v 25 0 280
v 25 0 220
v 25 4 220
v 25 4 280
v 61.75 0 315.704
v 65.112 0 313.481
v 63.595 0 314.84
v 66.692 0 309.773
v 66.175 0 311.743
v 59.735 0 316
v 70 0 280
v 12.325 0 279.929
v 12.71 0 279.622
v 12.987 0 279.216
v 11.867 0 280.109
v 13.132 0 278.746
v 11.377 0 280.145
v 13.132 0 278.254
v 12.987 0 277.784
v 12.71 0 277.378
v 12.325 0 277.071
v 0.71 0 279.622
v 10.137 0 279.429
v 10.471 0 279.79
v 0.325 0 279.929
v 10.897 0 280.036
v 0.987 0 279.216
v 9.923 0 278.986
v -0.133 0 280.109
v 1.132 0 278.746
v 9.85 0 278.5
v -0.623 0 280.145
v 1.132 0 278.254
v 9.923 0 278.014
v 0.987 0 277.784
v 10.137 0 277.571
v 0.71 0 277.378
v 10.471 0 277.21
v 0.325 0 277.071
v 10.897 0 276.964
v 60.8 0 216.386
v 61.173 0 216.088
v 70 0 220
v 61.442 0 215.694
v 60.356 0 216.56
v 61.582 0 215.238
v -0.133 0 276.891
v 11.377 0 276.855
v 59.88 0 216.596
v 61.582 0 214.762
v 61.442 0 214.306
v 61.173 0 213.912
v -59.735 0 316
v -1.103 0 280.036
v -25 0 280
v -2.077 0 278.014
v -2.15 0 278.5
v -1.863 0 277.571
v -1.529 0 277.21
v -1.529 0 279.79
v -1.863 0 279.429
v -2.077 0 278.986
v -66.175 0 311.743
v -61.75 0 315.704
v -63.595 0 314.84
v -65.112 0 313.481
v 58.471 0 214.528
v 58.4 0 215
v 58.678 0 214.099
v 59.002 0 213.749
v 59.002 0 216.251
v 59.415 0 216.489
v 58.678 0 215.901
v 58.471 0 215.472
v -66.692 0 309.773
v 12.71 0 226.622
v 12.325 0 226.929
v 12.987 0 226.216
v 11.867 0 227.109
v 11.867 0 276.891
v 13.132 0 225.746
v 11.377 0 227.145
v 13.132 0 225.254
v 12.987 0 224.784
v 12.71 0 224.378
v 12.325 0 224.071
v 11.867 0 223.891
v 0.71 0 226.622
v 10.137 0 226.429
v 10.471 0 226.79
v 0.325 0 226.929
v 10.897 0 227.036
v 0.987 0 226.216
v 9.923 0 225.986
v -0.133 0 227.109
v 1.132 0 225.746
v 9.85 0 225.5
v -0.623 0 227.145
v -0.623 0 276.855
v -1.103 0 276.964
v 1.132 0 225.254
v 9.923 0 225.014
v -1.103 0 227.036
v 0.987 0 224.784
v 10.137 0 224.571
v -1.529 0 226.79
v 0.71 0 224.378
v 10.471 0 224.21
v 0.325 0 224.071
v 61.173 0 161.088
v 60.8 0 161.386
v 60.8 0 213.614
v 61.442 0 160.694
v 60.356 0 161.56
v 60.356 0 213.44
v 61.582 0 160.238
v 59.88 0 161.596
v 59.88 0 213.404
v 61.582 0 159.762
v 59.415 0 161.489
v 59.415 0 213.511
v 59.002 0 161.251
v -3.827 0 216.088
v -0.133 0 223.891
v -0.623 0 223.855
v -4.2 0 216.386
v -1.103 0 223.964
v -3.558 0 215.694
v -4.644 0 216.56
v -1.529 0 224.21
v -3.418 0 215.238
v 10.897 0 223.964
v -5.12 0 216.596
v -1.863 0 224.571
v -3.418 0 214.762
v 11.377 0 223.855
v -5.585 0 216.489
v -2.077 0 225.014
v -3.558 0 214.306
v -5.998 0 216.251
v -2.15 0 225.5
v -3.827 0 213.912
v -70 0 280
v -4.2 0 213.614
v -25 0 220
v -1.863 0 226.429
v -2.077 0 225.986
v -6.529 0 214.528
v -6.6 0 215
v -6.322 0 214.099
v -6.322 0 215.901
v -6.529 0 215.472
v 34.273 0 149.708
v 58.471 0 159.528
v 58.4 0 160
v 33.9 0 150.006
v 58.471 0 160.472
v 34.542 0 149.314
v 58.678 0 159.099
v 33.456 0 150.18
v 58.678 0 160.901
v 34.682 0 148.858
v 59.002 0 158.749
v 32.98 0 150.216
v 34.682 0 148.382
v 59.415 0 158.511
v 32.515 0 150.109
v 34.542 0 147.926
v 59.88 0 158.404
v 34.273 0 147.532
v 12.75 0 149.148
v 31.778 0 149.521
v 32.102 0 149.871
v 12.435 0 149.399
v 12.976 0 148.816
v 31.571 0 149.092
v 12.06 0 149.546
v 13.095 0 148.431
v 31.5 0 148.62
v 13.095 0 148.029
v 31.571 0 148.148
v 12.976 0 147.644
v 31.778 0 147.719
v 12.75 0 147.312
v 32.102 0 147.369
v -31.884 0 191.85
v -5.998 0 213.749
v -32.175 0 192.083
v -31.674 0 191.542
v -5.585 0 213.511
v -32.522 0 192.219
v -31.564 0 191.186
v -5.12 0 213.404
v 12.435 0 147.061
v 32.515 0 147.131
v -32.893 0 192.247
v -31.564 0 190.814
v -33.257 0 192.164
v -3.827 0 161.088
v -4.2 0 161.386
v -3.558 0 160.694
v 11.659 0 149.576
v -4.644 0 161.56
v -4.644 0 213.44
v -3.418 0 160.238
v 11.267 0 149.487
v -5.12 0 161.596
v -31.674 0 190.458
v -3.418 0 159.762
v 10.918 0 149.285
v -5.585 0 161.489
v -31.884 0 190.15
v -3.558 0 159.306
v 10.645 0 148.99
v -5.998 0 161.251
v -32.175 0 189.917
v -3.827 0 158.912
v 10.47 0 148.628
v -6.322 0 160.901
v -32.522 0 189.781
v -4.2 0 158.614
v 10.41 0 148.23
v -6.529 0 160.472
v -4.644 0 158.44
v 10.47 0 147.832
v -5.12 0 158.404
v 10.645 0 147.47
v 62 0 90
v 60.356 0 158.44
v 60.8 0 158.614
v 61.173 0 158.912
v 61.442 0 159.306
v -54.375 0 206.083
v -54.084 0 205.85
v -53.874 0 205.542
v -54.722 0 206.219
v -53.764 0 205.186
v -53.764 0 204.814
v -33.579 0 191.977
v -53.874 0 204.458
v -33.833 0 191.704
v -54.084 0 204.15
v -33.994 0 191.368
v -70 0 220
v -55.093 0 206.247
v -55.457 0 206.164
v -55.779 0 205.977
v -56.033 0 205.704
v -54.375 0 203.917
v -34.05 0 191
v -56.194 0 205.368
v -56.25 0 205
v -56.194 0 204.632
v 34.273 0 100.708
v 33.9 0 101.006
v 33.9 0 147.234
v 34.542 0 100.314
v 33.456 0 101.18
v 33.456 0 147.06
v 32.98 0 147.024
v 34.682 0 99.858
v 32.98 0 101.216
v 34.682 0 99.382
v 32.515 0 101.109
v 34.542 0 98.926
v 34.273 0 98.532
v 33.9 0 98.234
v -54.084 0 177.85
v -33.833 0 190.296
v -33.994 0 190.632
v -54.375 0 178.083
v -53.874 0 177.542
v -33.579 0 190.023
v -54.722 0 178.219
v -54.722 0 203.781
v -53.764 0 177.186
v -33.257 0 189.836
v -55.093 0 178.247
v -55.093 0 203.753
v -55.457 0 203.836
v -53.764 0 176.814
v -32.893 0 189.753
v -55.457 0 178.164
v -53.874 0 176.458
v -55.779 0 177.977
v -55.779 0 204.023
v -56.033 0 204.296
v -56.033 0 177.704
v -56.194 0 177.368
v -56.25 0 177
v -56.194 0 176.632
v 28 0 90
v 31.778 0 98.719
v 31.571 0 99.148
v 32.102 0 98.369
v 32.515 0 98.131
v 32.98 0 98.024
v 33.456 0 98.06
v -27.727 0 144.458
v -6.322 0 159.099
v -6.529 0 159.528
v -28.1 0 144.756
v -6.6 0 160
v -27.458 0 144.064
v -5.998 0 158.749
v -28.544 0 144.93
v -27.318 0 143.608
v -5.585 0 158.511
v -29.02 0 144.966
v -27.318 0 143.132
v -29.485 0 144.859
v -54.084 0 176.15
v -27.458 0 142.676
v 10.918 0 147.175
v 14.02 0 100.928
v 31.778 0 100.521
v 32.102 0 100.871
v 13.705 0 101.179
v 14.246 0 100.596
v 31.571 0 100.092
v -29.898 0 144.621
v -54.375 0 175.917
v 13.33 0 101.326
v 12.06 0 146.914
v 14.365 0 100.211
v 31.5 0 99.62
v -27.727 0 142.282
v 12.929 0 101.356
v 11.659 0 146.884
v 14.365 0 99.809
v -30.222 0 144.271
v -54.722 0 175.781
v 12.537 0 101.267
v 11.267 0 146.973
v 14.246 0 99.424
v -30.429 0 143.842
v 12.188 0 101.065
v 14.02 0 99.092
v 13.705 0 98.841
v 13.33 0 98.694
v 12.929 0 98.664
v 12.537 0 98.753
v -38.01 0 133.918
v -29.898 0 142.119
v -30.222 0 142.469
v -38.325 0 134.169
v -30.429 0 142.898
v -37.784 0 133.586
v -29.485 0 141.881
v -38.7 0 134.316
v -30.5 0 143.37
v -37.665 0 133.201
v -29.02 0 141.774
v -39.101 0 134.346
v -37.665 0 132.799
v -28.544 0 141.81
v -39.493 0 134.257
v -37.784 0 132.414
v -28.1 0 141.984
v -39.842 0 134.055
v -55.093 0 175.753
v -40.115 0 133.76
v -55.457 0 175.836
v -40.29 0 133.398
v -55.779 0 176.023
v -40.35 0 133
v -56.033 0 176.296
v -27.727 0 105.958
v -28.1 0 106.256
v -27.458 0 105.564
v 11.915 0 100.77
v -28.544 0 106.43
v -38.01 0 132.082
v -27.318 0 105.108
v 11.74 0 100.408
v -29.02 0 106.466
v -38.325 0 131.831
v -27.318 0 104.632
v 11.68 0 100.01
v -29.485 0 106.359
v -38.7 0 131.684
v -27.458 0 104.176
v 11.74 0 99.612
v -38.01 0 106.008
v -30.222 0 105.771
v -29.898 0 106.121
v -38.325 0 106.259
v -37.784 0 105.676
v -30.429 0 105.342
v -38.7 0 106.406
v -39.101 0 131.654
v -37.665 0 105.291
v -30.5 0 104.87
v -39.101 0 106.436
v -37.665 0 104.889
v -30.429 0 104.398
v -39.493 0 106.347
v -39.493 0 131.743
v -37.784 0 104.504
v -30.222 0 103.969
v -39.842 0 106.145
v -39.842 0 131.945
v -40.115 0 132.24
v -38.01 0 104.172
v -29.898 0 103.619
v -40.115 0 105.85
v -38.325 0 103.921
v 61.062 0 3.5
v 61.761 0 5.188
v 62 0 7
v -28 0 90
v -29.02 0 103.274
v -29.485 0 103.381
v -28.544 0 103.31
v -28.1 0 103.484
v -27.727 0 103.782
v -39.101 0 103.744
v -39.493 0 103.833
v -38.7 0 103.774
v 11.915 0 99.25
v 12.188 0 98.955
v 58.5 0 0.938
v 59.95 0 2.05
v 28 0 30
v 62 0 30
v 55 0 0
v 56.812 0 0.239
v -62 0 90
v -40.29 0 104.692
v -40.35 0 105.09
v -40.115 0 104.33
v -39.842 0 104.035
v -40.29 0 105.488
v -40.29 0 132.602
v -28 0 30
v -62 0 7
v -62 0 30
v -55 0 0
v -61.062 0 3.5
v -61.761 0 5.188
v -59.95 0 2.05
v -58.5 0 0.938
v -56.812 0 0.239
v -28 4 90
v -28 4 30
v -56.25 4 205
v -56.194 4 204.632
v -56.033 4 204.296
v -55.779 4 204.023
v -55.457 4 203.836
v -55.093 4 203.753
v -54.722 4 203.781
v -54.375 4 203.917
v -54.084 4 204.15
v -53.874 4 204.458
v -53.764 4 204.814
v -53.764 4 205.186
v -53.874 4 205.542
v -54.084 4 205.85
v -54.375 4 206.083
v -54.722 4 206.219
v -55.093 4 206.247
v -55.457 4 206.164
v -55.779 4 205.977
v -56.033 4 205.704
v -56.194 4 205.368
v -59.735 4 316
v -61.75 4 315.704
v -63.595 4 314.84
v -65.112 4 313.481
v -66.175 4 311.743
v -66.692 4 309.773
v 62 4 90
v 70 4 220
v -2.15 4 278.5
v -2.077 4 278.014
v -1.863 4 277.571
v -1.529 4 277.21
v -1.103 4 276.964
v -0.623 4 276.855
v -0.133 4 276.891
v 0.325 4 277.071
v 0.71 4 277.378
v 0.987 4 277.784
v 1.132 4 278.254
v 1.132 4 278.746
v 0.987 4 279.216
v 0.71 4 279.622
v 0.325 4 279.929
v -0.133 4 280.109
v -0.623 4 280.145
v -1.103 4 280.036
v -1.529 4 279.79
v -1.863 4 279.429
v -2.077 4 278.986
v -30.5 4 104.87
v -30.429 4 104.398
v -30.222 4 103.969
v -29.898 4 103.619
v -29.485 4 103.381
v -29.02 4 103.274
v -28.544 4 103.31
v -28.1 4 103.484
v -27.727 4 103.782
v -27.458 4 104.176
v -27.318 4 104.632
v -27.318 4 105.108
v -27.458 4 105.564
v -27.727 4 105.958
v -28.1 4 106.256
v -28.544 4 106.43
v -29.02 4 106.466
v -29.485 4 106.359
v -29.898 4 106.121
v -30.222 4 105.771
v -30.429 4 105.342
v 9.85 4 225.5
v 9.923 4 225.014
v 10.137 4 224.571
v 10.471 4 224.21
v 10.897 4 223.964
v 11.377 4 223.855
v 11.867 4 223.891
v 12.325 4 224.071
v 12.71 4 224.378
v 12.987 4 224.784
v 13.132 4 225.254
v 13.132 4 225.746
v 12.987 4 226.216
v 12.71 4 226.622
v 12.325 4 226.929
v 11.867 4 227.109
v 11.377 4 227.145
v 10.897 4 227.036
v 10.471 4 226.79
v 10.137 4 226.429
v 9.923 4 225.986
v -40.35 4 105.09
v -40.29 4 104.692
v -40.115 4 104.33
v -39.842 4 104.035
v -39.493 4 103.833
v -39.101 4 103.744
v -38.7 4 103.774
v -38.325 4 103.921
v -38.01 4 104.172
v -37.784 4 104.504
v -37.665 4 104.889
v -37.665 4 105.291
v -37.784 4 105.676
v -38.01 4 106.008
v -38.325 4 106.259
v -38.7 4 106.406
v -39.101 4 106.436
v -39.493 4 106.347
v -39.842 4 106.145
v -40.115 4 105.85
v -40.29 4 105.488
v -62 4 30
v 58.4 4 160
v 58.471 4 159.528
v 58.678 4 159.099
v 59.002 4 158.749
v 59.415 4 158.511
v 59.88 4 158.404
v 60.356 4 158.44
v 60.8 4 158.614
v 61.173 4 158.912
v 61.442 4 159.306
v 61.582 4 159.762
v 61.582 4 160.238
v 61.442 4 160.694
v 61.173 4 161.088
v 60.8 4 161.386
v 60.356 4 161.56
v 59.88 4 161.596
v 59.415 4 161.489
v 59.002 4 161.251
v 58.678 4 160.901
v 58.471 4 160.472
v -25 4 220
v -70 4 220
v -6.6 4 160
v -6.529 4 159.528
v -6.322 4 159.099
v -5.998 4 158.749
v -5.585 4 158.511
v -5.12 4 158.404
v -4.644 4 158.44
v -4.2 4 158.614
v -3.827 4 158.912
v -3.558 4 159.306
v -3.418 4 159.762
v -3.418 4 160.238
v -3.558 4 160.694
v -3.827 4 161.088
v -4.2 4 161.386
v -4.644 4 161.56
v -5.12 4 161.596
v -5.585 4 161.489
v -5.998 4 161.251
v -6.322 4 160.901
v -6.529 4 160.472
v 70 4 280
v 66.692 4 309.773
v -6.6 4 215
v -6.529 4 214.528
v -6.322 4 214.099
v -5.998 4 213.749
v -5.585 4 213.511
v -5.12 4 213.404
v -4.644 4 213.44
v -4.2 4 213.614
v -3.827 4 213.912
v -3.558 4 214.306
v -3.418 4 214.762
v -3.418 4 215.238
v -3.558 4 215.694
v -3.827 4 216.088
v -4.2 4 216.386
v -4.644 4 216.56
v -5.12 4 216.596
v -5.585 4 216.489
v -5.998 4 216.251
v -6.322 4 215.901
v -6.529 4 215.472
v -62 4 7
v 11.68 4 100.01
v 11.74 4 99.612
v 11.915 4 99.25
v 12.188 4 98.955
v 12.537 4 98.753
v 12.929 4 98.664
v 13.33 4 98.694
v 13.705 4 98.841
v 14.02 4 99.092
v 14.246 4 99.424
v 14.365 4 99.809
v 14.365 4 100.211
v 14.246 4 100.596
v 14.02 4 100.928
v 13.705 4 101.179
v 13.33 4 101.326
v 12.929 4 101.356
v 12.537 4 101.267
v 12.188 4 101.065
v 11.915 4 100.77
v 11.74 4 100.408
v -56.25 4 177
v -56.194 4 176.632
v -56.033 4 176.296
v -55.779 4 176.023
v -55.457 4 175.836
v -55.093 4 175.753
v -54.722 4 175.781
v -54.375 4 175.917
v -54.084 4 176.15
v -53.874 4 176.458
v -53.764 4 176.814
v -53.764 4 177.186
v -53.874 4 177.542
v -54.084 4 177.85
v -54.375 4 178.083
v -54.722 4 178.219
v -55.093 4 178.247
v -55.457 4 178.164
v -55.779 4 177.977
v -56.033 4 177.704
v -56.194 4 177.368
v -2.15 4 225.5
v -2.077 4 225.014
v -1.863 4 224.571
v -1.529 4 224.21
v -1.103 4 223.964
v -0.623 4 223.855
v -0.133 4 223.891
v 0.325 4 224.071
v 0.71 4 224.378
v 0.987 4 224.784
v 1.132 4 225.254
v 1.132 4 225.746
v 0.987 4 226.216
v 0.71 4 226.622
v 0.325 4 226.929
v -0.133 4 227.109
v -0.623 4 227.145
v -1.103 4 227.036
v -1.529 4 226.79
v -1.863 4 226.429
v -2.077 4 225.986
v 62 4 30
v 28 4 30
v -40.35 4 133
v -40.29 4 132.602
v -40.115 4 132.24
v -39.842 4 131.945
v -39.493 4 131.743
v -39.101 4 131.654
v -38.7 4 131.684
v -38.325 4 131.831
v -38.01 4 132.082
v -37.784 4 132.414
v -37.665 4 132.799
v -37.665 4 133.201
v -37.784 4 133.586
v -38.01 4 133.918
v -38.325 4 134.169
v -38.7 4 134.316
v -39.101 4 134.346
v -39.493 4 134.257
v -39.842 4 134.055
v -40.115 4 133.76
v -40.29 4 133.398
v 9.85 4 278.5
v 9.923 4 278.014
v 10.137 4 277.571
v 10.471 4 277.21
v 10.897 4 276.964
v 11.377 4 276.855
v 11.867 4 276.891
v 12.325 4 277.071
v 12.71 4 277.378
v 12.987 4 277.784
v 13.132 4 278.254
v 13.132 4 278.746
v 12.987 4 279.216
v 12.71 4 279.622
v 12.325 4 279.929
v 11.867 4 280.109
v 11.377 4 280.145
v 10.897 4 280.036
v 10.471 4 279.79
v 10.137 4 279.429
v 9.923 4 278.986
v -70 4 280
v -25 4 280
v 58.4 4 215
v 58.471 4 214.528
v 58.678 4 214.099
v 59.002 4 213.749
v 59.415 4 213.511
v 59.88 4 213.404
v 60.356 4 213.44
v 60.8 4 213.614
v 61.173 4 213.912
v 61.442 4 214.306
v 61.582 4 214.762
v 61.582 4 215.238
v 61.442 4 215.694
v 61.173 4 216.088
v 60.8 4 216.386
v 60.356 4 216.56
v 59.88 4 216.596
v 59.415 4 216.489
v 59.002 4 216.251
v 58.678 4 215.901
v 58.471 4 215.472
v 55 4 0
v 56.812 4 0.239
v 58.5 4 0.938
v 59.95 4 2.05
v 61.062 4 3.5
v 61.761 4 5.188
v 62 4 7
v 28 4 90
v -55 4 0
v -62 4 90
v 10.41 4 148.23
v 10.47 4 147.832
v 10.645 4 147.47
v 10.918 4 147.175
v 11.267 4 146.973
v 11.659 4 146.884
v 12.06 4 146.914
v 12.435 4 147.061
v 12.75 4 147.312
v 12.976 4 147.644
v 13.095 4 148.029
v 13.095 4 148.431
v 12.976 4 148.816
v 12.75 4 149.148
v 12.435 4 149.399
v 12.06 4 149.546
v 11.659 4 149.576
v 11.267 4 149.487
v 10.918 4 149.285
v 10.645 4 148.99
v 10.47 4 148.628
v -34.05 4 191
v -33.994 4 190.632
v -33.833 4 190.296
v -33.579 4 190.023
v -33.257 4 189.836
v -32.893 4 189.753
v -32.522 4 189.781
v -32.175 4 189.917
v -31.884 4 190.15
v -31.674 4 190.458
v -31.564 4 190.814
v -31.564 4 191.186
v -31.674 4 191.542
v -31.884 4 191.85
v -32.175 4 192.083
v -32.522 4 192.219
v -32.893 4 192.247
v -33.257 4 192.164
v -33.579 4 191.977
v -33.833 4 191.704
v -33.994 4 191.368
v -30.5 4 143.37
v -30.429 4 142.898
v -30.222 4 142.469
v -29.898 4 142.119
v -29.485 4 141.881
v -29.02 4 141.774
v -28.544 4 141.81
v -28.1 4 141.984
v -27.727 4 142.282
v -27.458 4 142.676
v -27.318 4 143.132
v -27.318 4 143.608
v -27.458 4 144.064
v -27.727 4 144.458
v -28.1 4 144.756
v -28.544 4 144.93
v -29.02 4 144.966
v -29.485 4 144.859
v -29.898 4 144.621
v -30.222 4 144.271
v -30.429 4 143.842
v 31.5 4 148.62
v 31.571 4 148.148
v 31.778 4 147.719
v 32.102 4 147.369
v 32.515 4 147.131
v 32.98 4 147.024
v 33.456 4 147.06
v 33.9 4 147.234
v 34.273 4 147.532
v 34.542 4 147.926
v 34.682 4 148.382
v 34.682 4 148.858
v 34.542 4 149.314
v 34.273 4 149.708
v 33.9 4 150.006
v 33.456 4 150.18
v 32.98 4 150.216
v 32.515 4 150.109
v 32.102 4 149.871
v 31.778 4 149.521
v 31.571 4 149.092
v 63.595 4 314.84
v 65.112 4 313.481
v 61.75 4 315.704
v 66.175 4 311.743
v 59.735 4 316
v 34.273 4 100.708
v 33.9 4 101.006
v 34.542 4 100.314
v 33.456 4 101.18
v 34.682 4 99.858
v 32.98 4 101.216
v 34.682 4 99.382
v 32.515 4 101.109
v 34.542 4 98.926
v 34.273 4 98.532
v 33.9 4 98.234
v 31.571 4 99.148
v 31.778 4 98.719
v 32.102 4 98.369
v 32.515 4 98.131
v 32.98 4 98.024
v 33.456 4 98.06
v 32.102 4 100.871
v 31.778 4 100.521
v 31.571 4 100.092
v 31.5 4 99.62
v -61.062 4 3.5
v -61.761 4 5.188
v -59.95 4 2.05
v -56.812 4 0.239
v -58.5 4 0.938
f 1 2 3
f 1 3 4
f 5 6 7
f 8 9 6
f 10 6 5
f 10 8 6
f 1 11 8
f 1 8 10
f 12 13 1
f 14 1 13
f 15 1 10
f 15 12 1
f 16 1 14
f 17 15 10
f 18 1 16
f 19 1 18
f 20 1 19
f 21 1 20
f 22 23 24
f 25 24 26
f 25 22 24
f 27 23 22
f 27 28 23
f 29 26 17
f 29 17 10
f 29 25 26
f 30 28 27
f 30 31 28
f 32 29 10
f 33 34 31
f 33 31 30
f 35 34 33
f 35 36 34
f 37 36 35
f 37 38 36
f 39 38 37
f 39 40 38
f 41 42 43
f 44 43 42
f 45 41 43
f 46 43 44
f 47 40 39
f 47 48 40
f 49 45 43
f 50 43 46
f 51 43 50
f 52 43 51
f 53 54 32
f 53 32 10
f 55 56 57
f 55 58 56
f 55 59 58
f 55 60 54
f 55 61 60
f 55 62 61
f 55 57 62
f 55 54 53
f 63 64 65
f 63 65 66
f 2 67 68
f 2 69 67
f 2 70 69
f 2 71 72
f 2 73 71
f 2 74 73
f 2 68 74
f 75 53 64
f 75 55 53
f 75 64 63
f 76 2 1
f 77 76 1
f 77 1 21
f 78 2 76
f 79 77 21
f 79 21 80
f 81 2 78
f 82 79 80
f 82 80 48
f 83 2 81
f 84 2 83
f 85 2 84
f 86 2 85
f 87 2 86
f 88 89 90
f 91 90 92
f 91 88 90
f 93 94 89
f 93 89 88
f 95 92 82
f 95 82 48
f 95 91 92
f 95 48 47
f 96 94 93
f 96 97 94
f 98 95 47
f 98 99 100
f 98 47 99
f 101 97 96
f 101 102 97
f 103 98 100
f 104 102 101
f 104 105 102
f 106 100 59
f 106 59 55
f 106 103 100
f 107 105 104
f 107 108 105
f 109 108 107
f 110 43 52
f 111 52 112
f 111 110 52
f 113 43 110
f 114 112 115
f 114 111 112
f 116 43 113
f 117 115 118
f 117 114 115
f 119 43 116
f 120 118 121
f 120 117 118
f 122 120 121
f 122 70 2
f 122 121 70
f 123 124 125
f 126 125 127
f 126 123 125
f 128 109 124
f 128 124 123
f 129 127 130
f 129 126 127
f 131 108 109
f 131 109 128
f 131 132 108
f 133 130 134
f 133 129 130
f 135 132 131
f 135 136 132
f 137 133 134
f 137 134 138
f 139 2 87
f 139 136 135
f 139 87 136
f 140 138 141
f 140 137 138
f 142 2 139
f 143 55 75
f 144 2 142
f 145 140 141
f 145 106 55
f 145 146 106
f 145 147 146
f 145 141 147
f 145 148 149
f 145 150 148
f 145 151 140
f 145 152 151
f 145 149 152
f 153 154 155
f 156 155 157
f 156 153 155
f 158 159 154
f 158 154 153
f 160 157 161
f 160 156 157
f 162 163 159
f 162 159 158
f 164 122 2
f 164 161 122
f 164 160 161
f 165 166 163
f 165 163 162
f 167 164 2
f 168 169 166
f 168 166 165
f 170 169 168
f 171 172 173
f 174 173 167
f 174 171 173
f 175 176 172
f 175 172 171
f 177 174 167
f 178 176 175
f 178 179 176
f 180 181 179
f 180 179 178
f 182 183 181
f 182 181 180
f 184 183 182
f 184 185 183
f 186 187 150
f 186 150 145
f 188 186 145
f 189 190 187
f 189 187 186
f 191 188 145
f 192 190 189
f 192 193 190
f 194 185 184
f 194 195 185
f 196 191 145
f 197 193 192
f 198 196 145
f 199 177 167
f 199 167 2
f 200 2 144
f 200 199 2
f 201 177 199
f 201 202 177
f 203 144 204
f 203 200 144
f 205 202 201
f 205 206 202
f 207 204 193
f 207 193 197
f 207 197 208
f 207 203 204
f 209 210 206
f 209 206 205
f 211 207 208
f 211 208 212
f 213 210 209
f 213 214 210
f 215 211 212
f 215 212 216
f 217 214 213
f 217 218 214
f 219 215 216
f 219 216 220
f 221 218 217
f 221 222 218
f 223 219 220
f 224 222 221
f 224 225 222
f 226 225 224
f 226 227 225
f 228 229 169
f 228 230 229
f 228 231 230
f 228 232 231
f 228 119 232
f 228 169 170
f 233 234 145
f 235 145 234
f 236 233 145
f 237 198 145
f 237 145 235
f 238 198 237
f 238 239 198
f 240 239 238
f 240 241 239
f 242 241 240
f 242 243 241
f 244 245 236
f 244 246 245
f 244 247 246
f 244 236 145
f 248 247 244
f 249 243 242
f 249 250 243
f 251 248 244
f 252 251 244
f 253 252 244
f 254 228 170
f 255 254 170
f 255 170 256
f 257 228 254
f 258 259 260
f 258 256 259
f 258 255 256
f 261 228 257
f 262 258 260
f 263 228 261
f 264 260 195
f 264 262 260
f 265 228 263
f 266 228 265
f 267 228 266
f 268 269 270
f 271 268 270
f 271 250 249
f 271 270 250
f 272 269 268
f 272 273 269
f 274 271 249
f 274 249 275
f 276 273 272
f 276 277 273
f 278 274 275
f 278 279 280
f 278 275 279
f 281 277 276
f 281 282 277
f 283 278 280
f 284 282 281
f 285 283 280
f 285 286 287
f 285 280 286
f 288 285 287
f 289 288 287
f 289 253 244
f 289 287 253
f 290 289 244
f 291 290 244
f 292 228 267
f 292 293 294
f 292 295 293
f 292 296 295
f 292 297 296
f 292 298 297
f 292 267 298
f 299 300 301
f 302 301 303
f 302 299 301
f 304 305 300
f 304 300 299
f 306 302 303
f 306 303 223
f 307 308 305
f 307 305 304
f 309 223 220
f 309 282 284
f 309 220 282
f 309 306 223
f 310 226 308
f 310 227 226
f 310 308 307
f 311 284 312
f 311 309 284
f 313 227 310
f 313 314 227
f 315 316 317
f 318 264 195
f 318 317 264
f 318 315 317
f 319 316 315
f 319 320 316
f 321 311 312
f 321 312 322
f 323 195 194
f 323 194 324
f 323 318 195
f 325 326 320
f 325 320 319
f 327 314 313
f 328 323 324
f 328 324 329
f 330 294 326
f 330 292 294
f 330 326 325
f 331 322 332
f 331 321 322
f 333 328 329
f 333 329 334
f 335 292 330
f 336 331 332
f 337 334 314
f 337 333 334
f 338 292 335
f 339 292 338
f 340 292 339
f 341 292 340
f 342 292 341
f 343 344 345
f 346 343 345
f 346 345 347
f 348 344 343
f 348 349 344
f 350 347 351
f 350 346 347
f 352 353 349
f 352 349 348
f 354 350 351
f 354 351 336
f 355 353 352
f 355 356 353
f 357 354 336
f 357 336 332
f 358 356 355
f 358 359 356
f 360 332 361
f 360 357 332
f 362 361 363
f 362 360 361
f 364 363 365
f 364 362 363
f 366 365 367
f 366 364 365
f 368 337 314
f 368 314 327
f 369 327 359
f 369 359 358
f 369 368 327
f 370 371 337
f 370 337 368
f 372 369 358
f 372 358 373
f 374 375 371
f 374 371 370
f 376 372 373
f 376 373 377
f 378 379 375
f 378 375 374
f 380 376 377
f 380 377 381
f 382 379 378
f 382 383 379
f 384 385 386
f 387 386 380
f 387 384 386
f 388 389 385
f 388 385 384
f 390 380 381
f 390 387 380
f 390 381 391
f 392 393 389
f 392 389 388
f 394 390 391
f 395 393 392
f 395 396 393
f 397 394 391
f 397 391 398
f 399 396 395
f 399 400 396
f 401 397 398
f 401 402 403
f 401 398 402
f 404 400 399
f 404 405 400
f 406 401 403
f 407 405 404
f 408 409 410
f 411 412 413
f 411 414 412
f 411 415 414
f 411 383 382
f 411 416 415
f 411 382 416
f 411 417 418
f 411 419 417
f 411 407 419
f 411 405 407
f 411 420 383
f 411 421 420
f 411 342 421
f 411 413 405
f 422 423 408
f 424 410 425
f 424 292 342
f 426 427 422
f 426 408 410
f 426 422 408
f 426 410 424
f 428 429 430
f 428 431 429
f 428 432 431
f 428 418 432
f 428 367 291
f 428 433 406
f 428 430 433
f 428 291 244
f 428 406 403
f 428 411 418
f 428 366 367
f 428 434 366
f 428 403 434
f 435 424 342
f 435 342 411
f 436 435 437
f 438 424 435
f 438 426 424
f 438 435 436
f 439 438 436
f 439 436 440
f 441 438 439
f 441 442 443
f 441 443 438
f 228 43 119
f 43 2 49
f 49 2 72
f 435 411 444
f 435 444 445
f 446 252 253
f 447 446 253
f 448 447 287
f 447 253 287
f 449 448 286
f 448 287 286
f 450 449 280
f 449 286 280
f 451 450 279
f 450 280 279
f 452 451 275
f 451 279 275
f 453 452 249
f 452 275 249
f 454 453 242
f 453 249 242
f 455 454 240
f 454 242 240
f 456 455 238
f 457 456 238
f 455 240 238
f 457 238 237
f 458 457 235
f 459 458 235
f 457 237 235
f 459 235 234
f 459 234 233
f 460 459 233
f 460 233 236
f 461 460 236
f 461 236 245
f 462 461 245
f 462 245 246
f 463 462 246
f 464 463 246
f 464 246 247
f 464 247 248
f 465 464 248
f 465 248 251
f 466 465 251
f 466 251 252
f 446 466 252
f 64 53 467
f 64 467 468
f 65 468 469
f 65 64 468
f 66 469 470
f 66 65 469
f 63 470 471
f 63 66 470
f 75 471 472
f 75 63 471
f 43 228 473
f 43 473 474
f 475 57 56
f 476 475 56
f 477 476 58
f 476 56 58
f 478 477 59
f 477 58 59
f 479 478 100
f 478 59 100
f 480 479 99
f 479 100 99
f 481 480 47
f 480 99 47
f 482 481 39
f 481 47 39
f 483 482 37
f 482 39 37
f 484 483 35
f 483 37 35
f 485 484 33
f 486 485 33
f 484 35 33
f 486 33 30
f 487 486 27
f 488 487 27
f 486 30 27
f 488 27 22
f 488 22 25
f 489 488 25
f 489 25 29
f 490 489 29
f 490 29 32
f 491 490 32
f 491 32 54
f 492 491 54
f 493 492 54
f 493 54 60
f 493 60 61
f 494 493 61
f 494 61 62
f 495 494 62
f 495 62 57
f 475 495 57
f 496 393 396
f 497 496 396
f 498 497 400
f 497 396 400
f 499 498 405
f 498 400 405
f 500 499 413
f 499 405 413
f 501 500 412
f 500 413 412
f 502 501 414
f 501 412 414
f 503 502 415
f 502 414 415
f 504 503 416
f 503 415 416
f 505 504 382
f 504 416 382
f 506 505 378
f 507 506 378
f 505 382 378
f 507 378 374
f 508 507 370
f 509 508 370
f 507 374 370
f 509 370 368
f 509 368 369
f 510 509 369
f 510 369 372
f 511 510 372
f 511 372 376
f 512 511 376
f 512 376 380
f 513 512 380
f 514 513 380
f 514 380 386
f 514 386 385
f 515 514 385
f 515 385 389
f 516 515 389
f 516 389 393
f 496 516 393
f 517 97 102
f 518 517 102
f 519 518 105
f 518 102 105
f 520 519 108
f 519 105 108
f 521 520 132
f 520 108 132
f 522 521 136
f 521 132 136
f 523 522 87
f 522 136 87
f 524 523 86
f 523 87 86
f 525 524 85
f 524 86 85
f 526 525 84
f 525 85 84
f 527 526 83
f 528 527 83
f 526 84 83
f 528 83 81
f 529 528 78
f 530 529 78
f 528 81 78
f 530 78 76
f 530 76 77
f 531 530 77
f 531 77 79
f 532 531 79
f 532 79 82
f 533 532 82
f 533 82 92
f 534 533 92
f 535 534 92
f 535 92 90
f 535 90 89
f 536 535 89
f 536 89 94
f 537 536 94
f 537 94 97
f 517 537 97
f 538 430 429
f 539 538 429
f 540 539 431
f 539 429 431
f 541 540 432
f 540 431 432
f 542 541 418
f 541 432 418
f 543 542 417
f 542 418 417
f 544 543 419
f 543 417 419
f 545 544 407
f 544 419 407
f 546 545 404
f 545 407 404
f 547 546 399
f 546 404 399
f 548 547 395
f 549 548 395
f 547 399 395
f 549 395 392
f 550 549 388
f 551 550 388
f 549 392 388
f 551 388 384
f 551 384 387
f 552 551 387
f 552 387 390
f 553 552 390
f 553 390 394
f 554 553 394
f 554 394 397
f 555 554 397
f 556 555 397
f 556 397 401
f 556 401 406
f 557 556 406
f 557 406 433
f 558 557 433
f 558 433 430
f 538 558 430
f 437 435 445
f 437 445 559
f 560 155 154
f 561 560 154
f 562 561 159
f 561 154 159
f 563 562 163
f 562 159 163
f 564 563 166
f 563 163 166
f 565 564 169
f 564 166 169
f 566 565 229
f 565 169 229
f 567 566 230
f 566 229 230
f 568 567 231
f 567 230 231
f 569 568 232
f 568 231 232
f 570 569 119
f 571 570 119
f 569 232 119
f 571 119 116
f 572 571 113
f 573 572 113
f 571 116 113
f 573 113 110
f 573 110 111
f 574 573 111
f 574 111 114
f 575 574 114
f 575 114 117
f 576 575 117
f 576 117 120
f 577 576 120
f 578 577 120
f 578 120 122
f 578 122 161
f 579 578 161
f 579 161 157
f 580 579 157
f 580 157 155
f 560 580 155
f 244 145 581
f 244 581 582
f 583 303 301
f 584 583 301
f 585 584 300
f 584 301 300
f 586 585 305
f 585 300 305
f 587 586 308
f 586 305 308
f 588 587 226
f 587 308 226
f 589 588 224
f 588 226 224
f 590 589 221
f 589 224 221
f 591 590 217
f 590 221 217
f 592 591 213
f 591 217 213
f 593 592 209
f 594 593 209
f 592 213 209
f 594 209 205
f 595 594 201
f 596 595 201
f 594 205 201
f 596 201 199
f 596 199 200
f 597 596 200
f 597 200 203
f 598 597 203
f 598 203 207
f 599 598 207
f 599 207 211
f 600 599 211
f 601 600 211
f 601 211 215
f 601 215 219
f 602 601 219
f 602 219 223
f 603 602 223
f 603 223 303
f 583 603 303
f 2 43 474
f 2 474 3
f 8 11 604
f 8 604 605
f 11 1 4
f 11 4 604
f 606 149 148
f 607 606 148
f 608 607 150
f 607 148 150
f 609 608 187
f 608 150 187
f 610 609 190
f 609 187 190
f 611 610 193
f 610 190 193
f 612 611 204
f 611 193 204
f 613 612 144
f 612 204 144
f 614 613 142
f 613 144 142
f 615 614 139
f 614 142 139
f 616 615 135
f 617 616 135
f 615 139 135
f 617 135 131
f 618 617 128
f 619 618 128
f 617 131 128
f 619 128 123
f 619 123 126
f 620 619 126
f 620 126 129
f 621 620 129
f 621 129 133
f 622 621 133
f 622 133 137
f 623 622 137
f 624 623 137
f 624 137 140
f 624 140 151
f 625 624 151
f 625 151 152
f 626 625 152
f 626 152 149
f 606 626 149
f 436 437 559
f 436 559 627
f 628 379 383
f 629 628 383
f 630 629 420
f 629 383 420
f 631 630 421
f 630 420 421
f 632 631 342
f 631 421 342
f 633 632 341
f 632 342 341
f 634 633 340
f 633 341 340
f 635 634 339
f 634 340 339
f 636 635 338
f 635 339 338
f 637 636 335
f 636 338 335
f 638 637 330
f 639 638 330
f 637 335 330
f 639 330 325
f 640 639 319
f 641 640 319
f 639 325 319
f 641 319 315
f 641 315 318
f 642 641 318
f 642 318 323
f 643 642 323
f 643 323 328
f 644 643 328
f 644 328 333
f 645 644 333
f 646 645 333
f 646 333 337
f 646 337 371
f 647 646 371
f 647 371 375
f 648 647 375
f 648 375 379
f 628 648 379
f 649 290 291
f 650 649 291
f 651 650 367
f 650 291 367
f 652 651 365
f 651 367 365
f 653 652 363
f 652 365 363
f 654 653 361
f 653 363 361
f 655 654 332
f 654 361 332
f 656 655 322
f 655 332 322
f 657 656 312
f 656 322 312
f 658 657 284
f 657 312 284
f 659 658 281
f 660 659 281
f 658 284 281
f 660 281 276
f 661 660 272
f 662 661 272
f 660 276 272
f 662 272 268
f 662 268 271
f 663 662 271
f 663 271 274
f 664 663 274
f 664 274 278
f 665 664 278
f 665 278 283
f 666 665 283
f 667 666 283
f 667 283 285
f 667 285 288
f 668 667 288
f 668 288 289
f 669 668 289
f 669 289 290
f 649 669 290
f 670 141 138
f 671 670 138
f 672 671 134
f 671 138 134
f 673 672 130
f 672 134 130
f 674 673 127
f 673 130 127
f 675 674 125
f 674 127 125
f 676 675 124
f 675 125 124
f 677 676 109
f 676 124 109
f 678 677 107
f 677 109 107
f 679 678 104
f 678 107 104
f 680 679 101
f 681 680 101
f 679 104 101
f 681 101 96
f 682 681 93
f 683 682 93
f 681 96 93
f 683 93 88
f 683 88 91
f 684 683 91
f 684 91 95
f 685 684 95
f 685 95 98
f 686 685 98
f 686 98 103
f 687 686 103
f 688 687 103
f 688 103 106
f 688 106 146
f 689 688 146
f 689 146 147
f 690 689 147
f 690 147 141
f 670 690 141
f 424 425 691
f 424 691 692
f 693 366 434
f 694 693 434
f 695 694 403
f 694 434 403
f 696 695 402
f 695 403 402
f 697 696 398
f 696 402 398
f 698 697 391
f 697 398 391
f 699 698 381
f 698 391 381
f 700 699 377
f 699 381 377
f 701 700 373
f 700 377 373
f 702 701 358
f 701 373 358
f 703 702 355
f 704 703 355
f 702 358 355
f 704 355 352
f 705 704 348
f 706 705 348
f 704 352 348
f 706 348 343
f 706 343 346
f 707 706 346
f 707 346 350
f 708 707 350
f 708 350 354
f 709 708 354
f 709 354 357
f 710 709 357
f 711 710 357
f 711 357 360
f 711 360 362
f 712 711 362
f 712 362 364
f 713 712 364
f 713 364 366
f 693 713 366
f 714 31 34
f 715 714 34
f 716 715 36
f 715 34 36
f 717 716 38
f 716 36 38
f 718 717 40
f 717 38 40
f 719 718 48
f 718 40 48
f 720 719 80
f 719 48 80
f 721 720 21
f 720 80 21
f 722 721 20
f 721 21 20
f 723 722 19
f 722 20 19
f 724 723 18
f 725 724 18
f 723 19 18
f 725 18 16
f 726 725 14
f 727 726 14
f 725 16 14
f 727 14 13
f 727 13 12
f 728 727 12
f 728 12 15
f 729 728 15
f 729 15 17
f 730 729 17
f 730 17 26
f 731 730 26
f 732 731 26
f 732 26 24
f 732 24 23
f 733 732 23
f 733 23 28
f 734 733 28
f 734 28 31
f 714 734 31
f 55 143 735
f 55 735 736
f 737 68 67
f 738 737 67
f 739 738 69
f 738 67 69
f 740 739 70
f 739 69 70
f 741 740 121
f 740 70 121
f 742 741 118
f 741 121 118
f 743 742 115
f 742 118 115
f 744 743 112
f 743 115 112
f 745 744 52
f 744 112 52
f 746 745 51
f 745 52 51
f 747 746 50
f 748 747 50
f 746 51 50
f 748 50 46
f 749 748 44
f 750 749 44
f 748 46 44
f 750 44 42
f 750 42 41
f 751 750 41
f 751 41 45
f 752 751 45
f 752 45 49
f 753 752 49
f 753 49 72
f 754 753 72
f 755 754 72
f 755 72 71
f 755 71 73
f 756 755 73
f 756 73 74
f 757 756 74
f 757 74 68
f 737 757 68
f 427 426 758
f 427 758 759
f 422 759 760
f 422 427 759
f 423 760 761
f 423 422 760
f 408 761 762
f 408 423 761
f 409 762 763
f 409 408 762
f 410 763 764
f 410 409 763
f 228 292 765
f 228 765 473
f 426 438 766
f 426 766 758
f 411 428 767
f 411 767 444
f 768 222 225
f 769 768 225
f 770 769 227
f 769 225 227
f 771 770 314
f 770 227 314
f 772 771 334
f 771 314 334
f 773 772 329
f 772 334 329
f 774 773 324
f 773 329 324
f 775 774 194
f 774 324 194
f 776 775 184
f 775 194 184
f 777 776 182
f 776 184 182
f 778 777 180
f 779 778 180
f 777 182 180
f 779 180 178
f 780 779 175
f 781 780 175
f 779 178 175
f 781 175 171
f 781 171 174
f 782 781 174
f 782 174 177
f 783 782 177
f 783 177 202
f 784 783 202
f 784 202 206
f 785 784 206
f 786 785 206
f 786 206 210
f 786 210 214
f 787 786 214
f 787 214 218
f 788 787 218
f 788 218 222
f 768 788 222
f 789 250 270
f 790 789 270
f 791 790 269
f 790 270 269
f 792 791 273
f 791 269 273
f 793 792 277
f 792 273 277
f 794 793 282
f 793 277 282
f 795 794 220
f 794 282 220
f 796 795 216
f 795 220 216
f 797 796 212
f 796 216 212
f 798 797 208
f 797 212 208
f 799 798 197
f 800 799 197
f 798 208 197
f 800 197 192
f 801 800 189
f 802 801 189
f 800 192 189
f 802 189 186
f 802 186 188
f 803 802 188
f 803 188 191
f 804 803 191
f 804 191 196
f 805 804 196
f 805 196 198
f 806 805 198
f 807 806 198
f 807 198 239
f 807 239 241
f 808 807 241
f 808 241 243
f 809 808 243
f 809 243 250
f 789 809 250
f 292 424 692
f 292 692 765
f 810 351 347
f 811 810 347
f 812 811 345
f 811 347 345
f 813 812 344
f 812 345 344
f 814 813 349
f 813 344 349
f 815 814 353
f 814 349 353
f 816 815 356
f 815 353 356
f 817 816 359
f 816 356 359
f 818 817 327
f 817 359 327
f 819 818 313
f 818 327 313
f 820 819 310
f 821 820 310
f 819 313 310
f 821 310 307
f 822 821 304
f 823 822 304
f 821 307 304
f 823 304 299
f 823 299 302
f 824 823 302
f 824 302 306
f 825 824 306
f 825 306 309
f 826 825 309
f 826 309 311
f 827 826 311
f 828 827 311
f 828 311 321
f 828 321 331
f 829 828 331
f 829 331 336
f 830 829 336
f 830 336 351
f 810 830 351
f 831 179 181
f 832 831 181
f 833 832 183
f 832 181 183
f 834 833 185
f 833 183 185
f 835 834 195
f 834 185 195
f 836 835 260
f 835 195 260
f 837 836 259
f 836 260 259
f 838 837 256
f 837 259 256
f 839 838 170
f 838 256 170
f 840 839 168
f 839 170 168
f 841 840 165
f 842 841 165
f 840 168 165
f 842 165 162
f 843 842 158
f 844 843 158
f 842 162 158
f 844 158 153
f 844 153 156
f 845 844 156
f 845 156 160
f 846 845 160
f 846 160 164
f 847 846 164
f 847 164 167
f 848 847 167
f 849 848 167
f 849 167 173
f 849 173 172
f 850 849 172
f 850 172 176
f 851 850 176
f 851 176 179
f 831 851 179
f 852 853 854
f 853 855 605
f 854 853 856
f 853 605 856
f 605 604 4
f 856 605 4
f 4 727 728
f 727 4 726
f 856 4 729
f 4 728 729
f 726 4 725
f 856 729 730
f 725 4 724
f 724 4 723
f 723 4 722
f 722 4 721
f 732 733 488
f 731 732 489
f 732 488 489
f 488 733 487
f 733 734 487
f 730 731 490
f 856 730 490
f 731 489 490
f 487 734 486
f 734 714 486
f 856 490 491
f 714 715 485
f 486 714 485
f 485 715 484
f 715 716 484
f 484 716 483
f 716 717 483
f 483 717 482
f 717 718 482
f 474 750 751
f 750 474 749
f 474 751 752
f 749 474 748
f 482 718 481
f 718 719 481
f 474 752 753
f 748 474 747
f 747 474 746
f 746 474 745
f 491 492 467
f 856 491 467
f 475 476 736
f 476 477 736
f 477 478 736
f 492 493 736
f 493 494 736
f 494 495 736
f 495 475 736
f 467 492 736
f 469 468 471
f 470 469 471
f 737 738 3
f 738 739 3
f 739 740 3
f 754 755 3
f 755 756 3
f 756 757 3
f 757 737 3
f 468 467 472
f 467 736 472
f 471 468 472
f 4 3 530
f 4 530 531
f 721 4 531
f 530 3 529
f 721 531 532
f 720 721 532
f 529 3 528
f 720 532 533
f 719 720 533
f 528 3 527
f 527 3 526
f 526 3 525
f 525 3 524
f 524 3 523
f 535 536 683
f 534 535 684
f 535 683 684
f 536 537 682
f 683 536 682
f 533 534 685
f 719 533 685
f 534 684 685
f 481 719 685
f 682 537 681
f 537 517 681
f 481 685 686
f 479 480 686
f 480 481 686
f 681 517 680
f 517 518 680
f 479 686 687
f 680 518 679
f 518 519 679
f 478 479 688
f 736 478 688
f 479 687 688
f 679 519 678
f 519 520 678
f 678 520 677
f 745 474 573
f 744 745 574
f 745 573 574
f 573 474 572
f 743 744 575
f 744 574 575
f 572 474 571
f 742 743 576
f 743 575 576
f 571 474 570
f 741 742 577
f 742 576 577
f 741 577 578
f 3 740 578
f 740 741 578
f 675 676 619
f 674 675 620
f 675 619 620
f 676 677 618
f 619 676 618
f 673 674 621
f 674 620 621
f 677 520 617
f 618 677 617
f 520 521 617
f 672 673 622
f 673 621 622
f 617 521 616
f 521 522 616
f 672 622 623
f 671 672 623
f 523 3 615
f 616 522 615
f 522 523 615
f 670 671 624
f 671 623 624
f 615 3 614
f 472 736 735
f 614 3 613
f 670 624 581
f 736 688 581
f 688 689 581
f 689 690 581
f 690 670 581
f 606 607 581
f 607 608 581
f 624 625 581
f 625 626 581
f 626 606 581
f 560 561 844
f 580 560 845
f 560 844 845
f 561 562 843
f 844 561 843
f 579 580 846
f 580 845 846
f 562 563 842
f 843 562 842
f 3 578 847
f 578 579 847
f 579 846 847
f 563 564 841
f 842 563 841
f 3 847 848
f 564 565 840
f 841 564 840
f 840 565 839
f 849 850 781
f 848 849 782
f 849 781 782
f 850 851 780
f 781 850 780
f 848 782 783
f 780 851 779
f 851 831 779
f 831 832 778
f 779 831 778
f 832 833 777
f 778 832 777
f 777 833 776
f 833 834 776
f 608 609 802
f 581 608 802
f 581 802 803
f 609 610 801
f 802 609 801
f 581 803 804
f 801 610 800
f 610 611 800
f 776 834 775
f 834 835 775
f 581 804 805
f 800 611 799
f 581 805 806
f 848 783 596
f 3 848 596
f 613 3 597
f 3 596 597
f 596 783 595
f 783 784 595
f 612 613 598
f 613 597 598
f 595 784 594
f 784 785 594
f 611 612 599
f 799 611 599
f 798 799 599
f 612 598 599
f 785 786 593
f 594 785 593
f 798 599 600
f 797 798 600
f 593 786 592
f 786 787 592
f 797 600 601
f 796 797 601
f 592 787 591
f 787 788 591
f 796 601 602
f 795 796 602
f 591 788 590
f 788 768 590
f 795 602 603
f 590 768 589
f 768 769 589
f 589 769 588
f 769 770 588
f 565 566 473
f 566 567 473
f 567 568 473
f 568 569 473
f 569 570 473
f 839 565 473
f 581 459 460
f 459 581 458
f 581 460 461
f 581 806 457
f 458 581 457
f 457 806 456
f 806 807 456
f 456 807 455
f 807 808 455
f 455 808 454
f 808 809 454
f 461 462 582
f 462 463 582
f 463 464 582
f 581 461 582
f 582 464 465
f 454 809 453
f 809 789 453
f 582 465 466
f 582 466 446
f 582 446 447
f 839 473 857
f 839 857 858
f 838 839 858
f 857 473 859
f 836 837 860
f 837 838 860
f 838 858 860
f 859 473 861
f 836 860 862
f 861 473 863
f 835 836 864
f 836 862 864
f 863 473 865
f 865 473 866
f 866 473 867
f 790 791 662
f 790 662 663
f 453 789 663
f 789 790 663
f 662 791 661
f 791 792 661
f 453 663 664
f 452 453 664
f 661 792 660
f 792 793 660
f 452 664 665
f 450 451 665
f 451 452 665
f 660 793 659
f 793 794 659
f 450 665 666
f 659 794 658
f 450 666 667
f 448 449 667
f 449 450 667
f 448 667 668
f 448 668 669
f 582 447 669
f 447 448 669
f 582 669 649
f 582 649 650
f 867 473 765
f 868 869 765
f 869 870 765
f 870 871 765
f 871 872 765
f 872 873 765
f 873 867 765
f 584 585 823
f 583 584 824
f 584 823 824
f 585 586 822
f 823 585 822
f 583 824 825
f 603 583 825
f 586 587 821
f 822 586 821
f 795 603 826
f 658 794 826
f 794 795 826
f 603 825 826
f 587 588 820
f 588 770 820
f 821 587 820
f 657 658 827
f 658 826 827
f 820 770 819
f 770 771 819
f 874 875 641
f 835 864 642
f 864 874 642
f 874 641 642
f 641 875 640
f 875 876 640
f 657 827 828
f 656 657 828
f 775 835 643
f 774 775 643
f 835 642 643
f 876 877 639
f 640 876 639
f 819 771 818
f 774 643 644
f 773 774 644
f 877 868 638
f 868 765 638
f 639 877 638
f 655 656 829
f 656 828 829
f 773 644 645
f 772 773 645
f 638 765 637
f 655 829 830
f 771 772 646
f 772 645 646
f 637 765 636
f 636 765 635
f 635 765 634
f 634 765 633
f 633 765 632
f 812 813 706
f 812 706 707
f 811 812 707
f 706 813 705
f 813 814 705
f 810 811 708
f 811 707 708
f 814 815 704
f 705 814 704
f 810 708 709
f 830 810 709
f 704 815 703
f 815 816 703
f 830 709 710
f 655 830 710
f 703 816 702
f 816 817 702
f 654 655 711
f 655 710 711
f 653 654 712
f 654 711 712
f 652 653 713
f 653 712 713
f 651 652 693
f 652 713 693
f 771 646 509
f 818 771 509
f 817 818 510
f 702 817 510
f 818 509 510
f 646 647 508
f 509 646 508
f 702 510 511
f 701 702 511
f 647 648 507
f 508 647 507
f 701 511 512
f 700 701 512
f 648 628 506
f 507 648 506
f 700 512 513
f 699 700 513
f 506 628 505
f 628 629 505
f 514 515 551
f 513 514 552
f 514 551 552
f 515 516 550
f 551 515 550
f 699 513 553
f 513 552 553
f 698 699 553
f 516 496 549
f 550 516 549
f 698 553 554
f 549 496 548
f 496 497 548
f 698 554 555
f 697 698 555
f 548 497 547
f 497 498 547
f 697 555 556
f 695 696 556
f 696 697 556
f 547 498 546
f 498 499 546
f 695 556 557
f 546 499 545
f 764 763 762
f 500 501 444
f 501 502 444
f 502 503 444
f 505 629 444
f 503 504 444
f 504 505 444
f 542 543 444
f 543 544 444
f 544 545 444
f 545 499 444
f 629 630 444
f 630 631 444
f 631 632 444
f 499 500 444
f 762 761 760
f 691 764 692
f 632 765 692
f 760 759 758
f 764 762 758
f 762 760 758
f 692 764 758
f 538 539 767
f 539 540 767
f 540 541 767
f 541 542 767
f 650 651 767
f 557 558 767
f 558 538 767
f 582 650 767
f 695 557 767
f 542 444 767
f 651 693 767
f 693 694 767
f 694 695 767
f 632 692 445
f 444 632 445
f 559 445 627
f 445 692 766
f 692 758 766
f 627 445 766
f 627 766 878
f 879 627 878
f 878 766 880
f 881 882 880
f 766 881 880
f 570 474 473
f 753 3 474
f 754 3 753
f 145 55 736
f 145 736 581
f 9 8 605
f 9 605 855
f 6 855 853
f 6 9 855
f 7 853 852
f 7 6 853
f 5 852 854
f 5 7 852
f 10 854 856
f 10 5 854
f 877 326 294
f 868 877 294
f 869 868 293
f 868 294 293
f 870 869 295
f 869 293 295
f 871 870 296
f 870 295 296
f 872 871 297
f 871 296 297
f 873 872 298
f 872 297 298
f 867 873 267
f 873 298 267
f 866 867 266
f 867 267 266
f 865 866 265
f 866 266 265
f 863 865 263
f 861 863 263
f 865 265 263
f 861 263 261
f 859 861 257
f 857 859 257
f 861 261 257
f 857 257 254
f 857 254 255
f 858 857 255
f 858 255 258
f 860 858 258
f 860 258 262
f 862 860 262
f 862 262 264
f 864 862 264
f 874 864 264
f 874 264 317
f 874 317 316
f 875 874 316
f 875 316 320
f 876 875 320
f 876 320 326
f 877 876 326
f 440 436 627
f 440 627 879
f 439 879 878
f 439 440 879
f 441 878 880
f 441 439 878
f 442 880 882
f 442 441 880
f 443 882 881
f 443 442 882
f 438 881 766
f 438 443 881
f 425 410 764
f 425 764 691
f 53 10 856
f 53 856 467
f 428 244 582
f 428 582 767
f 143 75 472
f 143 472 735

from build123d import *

# Parameters (mm, degrees)
BOSS_EXTRUDE1_DEPTH                        = 4
F_3_3_3_3_GATEN_TANDWIELKAST_D             = 3.3
F_2_5_2_5_BATTERIJ_HOUDER_D                = 2.5
F_2_7_2_7_ARDUINO_GATEN_D2_7_D             = 2.7
F_3_2_3_2_ARDUINO_GATEN_D3_2_D             = 3.2
F_3_2_3_2_BREADBOARD_ONDERSTEUNINGSPLAAT_D = 3.2


with BuildPart() as part:
    # grondplaat groene golf → Boss-Extrude1 (new body)
    with BuildSketch(Plane(origin=(0, 0, 0), x_dir=(1, 0, 0), z_dir=(0, 1, 0))):
        with BuildLine():
            Line((-55, 0), (55, 0))
            ThreePointArc((55, 0), (59.949747468, -2.050252532), (62, -7))
            Line((62, -7), (62, -30))
            Line((62, -30), (28, -30))
            Line((28, -30), (28, -90))
            Line((28, -90), (62, -90))
            Line((62, -90), (70, -220))
            Line((70, -220), (25, -220))
            Line((25, -220), (25, -280))
            Line((25, -280), (70, -280))
            Line((70, -280), (66.691886591, -309.773020683))
            ThreePointArc((66.691886591, -309.773020683), (64.403150685, -314.215896125), (59.734700448, -316))
            Line((59.734700448, -316), (-59.734700448, -316))
            ThreePointArc((-59.734700448, -316), (-64.403150685, -314.215896125), (-66.691886591, -309.773020683))
            Line((-66.691886591, -309.773020683), (-70, -280))
            Line((-70, -280), (-25, -280))
            Line((-25, -280), (-25, -220))
            Line((-25, -220), (-70, -220))
            Line((-70, -220), (-62, -90))
            Line((-62, -90), (-28, -90))
            Line((-28, -90), (-28, -30))
            Line((-28, -30), (-62, -30))
            Line((-62, -30), (-62, -7))
            ThreePointArc((-62, -7), (-59.949747468, -2.050252532), (-55, 0))
        make_face()
    extrude(amount=BOSS_EXTRUDE1_DEPTH)

    # Ø3.3 (3.3) gaten tandwielkast (through all)
    with Locations(Plane(origin=(0, 4, 0), x_dir=(1, 0, 0), z_dir=(0, 1, 0))):
        with Locations((11.5, -278.5), (-0.5, -278.5), (-0.5, -225.5), (11.5, -225.5)):
            Hole(F_3_3_3_3_GATEN_TANDWIELKAST_D / 2)

    # Ø2.5 (2.5) batterij houder (through all)
    with Locations(Plane(origin=(0, 4, 0), x_dir=(1, 0, 0), z_dir=(0, 1, 0))):
        with Locations((-55, -205), (-32.8, -191), (-55, -177)):
            Hole(F_2_5_2_5_BATTERIJ_HOUDER_D / 2)

    # Ø2.7 (2.7) Arduino gaten D2.7 (through all)
    with Locations(Plane(origin=(0, 4, 0), x_dir=(1, 0, 0), z_dir=(0, 1, 0))):
        with Locations((-39, -105.09), (-39, -133), (11.76, -148.23), (13.03, -100.01)):
            Hole(F_2_7_2_7_ARDUINO_GATEN_D2_7_D / 2)

    # Ø3.2 (3.2) Arduino gaten D3.2 (through all)
    with Locations(Plane(origin=(0, 4, 0), x_dir=(1, 0, 0), z_dir=(0, 1, 0))):
        with Locations((-28.9, -104.87), (-28.9, -143.37), (33.1, -99.62), (33.1, -148.62)):
            Hole(F_3_2_3_2_ARDUINO_GATEN_D3_2_D / 2)

    # Ø3.2 (3.2) Breadboard ondersteuningsplaatje (through all)
    with Locations(Plane(origin=(0, 4, 0), x_dir=(1, 0, 0), z_dir=(0, 1, 0))):
        with Locations((-5, -160), (60, -160), (-5, -215), (60, -215)):
            Hole(F_3_2_3_2_BREADBOARD_ONDERSTEUNINGSPLAAT_D / 2)


solid = part.part
